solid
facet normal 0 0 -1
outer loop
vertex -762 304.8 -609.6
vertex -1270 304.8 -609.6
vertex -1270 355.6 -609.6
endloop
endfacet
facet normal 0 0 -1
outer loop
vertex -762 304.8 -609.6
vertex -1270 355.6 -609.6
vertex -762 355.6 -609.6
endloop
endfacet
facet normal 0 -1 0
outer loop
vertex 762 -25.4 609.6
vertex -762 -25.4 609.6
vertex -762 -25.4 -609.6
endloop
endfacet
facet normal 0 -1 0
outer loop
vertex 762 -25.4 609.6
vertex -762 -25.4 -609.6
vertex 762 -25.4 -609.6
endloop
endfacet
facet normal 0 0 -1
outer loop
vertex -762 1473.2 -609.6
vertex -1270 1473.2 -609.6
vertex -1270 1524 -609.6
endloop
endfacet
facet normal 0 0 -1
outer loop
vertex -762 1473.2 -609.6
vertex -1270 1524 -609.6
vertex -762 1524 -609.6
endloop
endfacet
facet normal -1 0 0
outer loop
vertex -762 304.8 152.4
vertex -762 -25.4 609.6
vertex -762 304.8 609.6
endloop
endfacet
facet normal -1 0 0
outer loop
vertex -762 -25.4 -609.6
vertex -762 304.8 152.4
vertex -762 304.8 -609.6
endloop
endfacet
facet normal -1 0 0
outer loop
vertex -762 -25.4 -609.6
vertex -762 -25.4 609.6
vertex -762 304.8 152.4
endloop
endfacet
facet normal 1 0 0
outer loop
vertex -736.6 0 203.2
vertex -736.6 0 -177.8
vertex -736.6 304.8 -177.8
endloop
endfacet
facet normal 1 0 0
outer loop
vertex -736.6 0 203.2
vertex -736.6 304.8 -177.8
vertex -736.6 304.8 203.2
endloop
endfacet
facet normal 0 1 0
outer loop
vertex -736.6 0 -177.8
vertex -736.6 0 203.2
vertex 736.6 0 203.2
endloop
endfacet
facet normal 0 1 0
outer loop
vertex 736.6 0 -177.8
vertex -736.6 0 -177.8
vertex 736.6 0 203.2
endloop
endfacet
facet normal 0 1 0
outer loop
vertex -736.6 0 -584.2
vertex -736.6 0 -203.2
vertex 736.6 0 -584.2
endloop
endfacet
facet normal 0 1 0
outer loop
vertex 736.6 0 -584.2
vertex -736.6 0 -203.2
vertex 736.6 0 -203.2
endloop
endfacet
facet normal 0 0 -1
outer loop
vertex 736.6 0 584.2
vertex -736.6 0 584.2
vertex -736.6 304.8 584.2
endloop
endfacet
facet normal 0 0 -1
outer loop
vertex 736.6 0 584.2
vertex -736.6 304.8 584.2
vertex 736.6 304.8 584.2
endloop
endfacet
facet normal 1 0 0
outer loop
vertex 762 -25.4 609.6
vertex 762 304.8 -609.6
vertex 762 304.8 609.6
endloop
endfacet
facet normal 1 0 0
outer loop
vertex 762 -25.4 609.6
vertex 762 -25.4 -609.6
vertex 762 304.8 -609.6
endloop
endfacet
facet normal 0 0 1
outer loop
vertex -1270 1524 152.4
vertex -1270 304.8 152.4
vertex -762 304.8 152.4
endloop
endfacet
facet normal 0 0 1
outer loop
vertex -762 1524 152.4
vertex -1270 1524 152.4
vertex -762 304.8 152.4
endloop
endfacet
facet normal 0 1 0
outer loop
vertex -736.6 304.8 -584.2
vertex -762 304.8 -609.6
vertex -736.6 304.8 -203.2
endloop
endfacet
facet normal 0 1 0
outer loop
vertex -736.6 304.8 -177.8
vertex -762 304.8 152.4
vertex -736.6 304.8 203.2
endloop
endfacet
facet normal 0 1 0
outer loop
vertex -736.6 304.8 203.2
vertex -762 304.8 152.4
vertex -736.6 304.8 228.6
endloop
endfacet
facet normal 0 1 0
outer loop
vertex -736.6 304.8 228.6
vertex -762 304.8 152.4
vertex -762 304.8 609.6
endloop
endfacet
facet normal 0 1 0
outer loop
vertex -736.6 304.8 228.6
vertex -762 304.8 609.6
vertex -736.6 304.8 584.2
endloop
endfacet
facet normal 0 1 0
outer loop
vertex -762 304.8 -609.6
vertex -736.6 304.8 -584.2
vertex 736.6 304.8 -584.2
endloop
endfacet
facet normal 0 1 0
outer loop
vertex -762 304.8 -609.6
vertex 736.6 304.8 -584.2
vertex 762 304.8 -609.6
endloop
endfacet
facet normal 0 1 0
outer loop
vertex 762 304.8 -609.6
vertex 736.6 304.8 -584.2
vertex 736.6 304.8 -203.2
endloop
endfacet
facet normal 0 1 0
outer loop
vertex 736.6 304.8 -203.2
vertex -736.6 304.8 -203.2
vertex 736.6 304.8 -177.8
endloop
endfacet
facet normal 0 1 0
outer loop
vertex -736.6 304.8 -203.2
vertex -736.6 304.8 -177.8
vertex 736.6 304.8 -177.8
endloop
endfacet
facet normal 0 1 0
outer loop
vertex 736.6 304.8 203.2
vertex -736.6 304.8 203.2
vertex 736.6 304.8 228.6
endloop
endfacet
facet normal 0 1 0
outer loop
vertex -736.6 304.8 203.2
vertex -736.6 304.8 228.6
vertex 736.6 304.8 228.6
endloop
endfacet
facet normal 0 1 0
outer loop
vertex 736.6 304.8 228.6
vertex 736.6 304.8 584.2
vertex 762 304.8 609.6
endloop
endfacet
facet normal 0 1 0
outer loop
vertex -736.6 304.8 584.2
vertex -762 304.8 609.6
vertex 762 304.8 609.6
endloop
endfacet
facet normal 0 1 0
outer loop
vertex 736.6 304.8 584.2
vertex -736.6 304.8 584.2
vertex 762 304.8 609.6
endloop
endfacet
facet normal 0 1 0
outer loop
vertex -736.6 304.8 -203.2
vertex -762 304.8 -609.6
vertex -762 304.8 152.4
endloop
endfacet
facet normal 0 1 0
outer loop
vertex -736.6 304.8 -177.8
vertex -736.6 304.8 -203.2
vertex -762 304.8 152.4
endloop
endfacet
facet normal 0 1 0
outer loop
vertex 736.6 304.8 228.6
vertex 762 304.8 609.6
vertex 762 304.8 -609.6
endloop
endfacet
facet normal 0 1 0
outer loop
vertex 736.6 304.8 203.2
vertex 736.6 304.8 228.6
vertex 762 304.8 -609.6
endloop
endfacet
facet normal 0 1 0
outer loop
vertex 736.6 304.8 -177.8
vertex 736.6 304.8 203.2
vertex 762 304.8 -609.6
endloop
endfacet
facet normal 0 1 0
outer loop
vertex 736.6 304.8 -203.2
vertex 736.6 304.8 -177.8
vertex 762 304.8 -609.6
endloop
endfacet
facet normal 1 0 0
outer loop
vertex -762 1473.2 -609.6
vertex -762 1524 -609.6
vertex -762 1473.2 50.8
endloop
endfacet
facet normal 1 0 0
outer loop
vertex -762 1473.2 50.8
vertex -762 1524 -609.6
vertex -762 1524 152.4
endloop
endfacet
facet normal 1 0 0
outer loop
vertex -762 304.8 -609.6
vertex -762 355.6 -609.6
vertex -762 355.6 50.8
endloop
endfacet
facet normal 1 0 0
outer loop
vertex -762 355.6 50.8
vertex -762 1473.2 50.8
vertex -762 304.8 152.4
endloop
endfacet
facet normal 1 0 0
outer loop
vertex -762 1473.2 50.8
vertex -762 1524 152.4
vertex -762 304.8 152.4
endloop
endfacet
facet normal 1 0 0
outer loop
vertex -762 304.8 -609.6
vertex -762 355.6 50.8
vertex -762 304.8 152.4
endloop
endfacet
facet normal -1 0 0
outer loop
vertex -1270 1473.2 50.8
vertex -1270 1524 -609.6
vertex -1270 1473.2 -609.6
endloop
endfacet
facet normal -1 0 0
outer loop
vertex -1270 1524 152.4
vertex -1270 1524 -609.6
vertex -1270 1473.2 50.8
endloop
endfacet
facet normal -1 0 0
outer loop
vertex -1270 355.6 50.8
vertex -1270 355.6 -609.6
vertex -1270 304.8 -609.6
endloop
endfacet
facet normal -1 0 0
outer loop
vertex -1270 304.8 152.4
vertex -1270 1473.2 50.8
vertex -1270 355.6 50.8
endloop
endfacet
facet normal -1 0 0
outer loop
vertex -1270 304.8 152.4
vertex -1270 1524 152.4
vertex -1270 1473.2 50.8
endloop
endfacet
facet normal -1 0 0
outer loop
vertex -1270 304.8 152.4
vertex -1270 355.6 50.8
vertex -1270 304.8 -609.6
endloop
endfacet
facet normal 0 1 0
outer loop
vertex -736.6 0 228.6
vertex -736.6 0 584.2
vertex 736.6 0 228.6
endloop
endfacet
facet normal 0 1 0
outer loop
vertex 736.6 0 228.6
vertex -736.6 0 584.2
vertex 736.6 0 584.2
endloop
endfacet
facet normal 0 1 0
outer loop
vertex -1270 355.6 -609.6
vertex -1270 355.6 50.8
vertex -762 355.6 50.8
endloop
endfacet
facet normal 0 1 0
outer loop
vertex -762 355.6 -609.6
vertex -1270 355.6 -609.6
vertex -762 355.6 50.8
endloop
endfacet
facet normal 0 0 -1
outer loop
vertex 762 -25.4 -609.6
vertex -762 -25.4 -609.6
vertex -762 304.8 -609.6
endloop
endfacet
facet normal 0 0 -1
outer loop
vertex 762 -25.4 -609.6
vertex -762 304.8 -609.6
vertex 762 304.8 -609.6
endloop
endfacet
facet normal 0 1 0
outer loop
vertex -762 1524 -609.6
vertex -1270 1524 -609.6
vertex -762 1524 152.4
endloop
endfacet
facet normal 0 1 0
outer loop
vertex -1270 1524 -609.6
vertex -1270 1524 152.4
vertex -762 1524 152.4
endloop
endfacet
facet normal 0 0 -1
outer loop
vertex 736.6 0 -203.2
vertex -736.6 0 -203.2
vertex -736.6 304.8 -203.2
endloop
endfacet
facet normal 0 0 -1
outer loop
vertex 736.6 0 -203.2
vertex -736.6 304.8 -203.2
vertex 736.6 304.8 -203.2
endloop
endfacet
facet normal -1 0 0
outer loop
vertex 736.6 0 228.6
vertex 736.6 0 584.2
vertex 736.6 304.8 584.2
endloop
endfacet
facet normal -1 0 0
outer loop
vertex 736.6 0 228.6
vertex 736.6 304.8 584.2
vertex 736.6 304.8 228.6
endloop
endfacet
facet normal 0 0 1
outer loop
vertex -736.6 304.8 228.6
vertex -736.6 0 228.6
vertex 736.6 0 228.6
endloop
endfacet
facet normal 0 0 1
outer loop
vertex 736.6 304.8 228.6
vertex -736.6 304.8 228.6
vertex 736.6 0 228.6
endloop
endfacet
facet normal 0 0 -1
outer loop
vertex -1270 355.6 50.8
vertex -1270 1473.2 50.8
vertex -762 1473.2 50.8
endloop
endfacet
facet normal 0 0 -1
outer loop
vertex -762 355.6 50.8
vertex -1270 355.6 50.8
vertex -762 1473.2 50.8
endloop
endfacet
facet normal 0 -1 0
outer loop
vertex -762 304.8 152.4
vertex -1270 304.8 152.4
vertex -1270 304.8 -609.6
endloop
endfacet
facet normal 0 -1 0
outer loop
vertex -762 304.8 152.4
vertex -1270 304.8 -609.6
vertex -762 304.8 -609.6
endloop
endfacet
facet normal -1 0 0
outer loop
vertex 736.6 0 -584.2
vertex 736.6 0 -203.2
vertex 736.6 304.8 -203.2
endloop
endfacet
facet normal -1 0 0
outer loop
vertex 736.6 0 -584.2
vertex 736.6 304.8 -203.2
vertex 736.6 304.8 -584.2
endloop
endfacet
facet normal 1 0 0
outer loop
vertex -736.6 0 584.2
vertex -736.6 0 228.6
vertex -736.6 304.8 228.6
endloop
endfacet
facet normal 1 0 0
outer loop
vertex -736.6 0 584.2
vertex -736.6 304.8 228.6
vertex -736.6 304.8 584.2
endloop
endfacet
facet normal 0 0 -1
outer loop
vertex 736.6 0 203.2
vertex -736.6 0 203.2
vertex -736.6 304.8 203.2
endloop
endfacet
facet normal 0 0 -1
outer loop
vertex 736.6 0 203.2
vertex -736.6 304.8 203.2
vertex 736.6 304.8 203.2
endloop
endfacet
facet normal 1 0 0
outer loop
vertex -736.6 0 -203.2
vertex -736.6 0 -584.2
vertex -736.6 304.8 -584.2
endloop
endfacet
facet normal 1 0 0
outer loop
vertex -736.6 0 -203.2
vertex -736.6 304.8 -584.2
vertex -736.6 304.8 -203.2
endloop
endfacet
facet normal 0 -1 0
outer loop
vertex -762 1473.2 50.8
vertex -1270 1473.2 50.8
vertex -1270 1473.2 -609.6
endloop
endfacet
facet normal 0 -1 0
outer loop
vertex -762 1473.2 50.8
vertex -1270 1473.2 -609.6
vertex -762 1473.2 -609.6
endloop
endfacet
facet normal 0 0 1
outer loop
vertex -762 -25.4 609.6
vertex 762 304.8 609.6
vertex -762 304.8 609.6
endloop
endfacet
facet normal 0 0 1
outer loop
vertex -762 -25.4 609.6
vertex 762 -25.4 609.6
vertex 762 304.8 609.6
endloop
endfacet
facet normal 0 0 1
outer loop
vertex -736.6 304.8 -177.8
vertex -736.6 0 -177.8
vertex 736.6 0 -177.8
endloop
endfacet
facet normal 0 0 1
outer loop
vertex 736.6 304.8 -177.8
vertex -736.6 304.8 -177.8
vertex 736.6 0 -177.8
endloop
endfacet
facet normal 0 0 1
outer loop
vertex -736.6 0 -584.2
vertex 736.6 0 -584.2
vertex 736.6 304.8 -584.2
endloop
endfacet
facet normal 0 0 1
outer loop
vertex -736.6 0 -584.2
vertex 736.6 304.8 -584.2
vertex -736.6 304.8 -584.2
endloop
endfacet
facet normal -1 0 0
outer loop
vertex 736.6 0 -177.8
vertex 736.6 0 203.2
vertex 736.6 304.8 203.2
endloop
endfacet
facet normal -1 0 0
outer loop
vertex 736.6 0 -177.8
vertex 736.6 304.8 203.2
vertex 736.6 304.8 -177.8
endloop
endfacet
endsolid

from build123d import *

# Parameters (mm, degrees)
F0_W     = 1473.2
F0_H     = 25.4
F0_H_2   = 355.6
F0_H_3   = 381
F1_DEPTH = 25.4
F2_DEPTH = 304.8
F4_W     = 508
F4_H     = 1219.2
F5_DEPTH = 101.6
F6_W     = 508
F6_H     = 50.8
F7_DEPTH = 660.4


with BuildPart() as f1:
    # F0 (on Front) → F1 (new body)
    with BuildSketch(Plane.XZ):
        with Locations((0, 215.9)):
            Rectangle(F0_W, F0_H)
        Polygon((762, -203.2), (762, 203.2), (736.6, 203.2), (736.6, -177.8), (736.6, -203.2), align=None)
        Polygon((-736.6, 203.2), (-762, 203.2), (-762, -203.2), (-736.6, -203.2), (-736.6, -177.8), align=None)
        Polygon((762, -609.6), (762, -203.2), (736.6, -203.2), (736.6, -584.2), (-736.6, -584.2), (-736.6, -203.2), (-762, -203.2), (-762, -609.6), align=None)
        Polygon((762, 203.2), (762, 609.6), (-762, 609.6), (-762, 203.2), (-736.6, 203.2), (-736.6, 228.6), (-736.6, 584.2), (736.6, 584.2), (736.6, 228.6), (736.6, 203.2), align=None)
        with Locations((0, 406.4)):
            Rectangle(F0_W, F0_H_2)
        with Locations((0, 12.7)):
            Rectangle(F0_W, F0_H_3)
        with Locations((0, -393.7)):
            Rectangle(F0_W, F0_H_3)
        with Locations((0, -190.5)):
            Rectangle(F0_W, F0_H)
    extrude(amount=F1_DEPTH)

    # F0 (on Front) → F2 (join)
    with BuildSketch(Plane.XZ):
        with Locations((0, 215.9)):
            Rectangle(F0_W, F0_H)
        Polygon((762, 203.2), (762, 609.6), (-762, 609.6), (-762, 203.2), (-736.6, 203.2), (-736.6, 228.6), (-736.6, 584.2), (736.6, 584.2), (736.6, 228.6), (736.6, 203.2), align=None)
        Polygon((-736.6, 203.2), (-762, 203.2), (-762, -203.2), (-736.6, -203.2), (-736.6, -177.8), align=None)
        Polygon((762, -203.2), (762, 203.2), (736.6, 203.2), (736.6, -177.8), (736.6, -203.2), align=None)
        with Locations((0, -190.5)):
            Rectangle(F0_W, F0_H)
        Polygon((762, -609.6), (762, -203.2), (736.6, -203.2), (736.6, -584.2), (-736.6, -584.2), (-736.6, -203.2), (-762, -203.2), (-762, -609.6), align=None)
    extrude(amount=-F2_DEPTH)



with BuildPart() as f5:
    # F4 (on offset) → F5 (new body)
    with BuildSketch(Plane.XY.offset(152.4)):
        with Locations((-1016, 914.4)):
            Rectangle(F4_W, F4_H)
    extrude(amount=-F5_DEPTH)


with BuildPart() as f1_1:
    add(f1.part)

    add(f5.part)  # F7 merges F5
    # F6 (on face) → F7 (join, through all)
    with BuildSketch(Plane(origin=(0, 0, 50.8), x_dir=(1, 0, 0), z_dir=(0, 0, -1))):
        with Locations((-1016, -1498.6)):
            Rectangle(F6_W, F6_H)
        with Locations((-1016, -330.2)):
            Rectangle(F6_W, F6_H)
    extrude(amount=F7_DEPTH)


solid = f1_1.part
